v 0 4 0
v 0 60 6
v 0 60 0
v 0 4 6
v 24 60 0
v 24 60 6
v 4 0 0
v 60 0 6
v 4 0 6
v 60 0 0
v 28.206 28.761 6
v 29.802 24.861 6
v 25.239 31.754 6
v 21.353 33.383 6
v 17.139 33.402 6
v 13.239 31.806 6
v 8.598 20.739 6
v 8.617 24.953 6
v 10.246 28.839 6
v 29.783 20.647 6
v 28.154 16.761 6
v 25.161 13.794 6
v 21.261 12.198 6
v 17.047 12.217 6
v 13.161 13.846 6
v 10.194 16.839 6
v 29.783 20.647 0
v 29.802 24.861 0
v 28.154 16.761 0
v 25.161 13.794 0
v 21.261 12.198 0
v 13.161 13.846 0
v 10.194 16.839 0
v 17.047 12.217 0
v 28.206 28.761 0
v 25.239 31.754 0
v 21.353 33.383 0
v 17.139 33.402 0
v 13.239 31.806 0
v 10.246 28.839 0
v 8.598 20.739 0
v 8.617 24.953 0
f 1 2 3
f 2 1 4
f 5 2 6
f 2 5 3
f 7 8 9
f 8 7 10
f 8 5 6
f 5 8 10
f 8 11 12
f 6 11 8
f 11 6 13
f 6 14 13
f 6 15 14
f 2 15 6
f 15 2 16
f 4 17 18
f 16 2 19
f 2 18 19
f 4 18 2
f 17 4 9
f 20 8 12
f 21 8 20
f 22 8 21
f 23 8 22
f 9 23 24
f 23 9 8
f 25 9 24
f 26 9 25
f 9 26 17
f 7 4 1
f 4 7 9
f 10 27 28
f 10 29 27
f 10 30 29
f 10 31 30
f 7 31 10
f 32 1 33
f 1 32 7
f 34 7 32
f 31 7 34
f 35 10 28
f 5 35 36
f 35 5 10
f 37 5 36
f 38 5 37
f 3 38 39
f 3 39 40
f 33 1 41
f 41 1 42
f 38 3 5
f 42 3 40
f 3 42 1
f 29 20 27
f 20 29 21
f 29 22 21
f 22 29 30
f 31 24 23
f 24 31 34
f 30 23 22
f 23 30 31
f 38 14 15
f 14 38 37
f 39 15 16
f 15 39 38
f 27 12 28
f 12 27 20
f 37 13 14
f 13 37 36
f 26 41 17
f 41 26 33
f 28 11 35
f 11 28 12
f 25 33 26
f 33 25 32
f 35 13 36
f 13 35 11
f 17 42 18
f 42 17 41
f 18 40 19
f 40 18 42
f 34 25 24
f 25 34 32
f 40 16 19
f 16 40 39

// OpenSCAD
$fn = 32;

// ----------------------------------------------------------------------
// Bracket plate: gusset 60 x 60
// ----------------------------------------------------------------------

// --- parameters (mm) ---
hole_r = 3;               // bolt hole radius
plate_t = 6;              // plate thickness, Z (extrusion height)
gus_a = 60;               // base length
gus_b = 60;               // height
top_x = 24;               // top edge X of the angled cut
light_r = 10.8;           // lightening hole radius

light_d = 2 * light_r;

profile = [[4, 0], [30, 0], [60, 0], [24, 60], [0, 60], [0, 4]];  // primary outline, 6 points, counter clockwise
void_1 = [[29.802, 24.861], [28.206, 28.761], [25.239, 31.754], [21.353, 33.383], [17.139, 33.402], [13.239, 31.806], [10.246, 28.839], [8.617, 24.953], [8.598, 20.739], [10.194, 16.839], [13.161, 13.846], [17.047, 12.217], [21.261, 12.198], [25.161, 13.794], [28.154, 16.761], [29.783, 20.647]];  // lightening hole, 16 points

// --- the one profile operation ---
difference() {
  linear_extrude(height = plate_t) polygon(points = profile);
  translate([0, 0, -1])
    linear_extrude(height = plate_t + 2) polygon(points = void_1);
}
